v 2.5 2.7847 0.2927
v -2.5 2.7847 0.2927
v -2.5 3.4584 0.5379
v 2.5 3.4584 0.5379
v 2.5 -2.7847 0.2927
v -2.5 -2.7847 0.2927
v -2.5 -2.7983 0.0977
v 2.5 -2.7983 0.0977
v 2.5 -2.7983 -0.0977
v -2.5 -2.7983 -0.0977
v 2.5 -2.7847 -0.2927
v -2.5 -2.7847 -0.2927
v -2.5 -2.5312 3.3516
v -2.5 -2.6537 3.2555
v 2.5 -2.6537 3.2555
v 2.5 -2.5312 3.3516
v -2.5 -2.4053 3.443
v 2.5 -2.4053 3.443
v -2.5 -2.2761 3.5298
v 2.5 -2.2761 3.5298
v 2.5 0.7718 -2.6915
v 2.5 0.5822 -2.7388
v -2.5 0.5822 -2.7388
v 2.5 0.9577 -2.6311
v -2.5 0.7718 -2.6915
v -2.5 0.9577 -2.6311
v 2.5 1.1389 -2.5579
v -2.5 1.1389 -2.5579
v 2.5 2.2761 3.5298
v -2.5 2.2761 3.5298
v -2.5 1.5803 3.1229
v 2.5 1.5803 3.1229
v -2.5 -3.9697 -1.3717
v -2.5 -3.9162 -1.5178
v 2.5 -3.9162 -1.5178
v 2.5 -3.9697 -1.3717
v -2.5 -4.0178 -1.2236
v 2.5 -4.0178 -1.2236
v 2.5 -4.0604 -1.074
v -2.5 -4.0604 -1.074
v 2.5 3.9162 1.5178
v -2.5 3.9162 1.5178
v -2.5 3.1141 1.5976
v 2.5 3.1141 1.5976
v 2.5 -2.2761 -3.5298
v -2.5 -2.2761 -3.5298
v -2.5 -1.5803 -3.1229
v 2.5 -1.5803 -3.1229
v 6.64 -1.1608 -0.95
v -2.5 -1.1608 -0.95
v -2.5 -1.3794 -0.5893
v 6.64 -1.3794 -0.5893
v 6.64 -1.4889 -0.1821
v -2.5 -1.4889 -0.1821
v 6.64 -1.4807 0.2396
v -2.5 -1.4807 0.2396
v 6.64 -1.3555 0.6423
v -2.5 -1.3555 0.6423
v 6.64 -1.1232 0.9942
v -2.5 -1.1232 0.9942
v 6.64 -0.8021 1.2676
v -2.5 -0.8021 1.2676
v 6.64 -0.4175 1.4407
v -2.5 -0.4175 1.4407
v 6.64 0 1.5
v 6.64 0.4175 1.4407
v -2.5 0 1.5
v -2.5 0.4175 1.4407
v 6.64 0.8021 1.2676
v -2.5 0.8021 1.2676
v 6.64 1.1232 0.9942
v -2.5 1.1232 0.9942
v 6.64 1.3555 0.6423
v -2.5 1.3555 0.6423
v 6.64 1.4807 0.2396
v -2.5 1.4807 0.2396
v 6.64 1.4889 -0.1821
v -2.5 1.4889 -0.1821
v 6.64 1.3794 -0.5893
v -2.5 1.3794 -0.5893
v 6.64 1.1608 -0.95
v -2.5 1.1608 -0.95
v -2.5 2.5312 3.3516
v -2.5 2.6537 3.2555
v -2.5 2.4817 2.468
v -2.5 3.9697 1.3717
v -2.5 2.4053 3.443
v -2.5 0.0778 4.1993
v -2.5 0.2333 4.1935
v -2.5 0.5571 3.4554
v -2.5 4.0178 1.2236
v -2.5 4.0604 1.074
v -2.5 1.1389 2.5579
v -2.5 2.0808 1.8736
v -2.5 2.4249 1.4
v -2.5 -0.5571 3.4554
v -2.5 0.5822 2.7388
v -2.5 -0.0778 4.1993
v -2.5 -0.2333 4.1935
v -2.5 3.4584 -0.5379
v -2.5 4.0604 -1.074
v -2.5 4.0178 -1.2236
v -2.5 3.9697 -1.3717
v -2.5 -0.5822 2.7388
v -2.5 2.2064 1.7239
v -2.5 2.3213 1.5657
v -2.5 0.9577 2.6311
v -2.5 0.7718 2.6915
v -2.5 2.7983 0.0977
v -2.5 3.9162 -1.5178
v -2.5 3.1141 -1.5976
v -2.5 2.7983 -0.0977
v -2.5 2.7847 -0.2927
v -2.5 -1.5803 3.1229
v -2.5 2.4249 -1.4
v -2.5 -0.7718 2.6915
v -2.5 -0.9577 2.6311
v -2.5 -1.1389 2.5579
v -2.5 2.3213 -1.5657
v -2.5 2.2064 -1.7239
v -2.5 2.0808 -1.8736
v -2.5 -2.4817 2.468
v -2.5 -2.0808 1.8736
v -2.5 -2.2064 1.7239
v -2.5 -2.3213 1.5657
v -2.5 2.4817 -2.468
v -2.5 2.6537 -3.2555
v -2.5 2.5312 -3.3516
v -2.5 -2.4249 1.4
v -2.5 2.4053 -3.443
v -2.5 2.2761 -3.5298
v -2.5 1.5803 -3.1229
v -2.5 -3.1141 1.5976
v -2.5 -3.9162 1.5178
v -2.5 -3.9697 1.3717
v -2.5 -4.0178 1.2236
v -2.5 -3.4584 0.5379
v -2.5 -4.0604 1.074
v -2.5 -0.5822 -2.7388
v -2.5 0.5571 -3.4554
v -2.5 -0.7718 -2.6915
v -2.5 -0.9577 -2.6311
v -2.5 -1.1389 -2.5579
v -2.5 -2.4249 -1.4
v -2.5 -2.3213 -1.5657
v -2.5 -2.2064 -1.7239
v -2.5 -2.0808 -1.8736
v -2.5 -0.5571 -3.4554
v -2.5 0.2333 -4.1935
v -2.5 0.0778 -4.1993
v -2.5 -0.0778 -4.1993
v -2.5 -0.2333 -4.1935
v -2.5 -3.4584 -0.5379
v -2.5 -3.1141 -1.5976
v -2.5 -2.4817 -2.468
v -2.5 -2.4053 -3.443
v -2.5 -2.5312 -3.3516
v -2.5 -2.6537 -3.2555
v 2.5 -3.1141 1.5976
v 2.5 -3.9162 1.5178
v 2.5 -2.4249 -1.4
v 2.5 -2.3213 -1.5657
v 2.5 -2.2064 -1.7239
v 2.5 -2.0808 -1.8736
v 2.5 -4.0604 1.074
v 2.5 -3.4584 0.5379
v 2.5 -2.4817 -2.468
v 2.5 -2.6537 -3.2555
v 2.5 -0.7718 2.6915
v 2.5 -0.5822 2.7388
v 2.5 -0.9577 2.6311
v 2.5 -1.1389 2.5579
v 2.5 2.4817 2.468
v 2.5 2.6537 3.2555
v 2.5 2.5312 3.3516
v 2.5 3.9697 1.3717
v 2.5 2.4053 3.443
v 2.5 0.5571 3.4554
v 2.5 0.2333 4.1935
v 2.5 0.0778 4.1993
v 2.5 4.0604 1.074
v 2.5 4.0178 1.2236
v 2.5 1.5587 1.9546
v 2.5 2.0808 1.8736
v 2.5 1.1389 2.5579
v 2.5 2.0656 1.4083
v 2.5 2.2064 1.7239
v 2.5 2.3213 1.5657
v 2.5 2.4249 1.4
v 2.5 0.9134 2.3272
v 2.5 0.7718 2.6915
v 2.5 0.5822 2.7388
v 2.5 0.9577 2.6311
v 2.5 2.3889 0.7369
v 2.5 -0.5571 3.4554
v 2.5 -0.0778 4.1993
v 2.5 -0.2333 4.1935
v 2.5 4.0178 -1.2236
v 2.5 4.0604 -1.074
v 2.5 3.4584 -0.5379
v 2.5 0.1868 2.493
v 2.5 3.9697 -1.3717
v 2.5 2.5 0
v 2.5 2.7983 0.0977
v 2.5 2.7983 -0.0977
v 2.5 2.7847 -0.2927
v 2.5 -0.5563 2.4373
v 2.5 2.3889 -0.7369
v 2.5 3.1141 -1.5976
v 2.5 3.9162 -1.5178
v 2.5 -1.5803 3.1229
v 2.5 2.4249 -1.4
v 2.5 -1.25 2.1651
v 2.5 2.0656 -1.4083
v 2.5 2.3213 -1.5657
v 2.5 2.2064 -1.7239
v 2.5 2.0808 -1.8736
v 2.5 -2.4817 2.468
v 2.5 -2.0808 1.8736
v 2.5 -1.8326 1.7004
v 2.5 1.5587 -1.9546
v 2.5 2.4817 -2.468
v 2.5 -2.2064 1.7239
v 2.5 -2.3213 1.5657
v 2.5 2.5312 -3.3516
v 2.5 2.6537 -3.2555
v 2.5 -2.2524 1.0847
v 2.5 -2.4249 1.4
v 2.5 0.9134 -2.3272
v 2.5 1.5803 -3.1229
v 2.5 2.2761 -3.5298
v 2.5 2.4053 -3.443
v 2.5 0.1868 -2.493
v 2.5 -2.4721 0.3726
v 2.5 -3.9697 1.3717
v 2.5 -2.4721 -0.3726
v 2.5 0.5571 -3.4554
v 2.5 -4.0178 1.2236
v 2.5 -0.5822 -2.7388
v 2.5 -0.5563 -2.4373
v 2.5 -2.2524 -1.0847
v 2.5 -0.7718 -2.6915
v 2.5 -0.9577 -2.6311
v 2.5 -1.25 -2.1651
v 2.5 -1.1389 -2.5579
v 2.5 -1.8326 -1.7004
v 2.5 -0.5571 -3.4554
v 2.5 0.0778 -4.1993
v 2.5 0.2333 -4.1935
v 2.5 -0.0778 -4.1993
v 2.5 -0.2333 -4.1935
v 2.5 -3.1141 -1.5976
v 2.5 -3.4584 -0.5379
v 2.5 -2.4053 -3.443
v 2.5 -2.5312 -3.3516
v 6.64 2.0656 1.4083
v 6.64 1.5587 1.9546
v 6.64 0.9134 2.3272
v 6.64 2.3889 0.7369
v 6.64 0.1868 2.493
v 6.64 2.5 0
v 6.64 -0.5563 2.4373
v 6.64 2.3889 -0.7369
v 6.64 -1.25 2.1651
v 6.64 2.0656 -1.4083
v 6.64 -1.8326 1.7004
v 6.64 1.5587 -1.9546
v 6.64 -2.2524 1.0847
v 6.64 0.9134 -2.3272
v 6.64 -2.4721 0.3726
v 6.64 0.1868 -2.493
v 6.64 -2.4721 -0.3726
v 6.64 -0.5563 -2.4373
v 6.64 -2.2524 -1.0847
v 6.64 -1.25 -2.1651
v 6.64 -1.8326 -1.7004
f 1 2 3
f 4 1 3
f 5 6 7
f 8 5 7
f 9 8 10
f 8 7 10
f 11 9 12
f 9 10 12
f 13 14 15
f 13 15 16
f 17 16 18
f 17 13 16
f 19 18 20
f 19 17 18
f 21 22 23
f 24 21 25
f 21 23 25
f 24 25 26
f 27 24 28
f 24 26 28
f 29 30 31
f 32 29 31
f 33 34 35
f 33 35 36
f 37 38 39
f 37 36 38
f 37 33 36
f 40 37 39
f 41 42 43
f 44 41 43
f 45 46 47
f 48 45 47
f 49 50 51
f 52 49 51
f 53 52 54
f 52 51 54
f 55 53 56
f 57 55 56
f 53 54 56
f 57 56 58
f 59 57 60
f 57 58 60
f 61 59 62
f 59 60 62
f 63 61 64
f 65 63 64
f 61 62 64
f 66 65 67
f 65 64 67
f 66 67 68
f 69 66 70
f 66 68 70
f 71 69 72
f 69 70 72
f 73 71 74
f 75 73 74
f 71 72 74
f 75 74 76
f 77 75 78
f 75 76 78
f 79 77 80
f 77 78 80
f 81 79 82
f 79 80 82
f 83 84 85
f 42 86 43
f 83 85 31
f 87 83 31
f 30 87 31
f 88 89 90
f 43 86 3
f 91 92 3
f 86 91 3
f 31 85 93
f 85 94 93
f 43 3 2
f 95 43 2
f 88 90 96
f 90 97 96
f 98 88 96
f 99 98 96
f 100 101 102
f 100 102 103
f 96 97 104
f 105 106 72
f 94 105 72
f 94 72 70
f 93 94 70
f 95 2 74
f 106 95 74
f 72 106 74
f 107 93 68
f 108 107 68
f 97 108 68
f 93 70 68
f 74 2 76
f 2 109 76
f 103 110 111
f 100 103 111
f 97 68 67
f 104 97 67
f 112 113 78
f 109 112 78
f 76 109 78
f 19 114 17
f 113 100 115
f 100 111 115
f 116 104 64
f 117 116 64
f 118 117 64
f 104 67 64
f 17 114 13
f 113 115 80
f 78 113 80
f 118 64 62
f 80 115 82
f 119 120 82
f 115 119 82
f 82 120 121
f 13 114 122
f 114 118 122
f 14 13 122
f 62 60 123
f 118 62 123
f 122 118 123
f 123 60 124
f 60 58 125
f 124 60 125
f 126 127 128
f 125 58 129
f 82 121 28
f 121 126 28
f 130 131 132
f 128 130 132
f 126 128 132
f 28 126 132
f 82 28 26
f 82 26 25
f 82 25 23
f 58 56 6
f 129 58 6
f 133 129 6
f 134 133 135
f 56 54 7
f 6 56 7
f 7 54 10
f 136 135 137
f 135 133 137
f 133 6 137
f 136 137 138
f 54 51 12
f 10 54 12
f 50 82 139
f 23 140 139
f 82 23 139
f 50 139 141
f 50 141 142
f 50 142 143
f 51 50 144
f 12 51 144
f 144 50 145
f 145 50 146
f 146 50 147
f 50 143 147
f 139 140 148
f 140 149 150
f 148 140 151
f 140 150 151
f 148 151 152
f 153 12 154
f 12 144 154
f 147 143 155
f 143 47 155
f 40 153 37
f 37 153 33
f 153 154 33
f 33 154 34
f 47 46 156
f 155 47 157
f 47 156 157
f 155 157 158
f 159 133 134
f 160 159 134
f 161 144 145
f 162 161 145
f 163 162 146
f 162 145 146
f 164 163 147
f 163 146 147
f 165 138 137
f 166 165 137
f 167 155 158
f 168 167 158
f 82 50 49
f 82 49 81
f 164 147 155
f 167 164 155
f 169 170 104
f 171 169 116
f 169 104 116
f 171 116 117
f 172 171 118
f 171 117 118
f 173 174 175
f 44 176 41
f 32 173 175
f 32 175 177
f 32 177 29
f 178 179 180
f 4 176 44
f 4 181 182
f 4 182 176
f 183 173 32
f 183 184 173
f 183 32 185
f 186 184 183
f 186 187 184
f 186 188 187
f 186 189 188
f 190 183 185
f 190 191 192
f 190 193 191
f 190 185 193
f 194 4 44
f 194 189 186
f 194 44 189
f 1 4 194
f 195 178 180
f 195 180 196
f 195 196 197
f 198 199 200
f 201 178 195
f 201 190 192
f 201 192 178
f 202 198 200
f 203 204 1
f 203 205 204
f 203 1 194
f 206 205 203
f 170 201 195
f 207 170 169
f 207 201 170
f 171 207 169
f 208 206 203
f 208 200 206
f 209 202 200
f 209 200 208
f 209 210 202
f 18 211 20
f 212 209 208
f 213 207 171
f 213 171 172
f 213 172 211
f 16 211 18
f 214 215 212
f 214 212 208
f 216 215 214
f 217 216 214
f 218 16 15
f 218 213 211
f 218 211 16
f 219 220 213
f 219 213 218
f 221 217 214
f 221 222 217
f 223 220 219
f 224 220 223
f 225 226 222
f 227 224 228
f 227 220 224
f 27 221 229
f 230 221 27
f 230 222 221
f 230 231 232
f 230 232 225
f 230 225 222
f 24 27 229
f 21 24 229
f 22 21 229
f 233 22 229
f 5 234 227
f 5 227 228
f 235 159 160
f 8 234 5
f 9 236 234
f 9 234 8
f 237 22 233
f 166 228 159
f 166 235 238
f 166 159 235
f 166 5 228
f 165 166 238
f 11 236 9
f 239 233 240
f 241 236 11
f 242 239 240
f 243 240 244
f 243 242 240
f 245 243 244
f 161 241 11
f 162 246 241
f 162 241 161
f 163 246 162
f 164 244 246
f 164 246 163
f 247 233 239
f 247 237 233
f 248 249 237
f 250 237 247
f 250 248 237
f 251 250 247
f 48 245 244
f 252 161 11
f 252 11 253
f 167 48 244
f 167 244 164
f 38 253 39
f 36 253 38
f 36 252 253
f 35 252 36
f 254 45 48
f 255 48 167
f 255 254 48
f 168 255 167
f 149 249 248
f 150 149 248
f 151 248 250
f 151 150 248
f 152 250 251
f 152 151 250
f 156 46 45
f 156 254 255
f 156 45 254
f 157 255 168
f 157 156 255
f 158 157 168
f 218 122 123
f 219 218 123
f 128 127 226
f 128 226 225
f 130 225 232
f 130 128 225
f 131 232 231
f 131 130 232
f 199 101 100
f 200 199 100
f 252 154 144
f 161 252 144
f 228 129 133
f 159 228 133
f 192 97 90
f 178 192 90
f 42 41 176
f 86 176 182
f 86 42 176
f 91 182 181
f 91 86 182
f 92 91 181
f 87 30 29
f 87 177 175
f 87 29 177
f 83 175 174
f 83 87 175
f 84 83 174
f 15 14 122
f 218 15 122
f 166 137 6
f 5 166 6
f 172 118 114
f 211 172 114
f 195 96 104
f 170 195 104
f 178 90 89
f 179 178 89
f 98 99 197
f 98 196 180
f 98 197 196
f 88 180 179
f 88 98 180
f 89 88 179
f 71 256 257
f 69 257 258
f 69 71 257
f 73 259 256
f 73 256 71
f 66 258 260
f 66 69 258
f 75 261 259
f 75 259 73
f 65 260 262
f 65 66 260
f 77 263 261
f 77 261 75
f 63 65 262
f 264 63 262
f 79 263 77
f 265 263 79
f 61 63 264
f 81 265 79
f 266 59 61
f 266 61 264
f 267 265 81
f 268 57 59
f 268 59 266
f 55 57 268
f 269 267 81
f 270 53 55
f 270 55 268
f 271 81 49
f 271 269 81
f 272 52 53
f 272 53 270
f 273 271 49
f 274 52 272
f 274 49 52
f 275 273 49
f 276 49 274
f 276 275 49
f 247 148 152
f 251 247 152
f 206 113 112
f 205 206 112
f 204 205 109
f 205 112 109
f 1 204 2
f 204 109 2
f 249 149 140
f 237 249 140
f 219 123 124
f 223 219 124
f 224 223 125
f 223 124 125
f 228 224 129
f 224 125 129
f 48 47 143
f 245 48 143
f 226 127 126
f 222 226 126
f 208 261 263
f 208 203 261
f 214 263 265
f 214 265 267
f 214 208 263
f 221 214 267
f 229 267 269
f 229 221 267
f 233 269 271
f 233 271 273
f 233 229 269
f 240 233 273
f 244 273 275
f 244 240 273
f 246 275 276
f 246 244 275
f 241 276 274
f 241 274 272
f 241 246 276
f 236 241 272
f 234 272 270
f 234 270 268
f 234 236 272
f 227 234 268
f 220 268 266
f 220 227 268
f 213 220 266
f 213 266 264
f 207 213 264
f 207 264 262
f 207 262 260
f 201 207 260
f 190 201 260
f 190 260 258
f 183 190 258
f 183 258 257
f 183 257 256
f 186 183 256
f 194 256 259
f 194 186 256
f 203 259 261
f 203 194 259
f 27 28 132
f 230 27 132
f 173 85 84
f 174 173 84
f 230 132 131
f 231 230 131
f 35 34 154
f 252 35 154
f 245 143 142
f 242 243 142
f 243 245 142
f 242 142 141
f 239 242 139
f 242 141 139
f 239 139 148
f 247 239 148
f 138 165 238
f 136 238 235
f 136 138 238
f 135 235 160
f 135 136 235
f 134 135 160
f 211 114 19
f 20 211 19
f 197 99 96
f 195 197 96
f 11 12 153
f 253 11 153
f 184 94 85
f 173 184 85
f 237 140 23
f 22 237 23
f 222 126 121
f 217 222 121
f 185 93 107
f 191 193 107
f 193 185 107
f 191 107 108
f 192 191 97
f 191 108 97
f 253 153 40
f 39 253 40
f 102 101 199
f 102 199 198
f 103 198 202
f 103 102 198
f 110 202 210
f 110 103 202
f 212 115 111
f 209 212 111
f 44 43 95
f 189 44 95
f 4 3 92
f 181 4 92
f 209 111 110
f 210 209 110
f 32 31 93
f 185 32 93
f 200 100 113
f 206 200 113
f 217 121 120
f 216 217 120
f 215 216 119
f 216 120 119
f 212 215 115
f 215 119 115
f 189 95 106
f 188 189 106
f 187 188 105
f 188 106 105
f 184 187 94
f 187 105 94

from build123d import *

# Parameters (mm, degrees)
ESQUISSE1_W              = 5
ESQUISSE1_H              = 4.2
ENL_V_MAT_EXTRU_1_DEPTH  = 6
ENL_V_MAT_EXTRU_2_DEPTH  = 6
ENL_V_MAT_EXTRU_3_DEPTH  = 6
ENL_V_MAT_EXTRU_4_DEPTH  = 6
ENL_V_MAT_EXTRU_5_DEPTH  = 6
ENL_V_MAT_EXTRU_6_DEPTH  = 6
ENL_V_MAT_EXTRU_7_DEPTH  = 6
ENL_V_MAT_EXTRU_8_DEPTH  = 6
ENL_V_MAT_EXTRU_9_DEPTH  = 6
ENL_V_MAT_EXTRU_10_DEPTH = 6
ENL_V_MAT_EXTRU_11_DEPTH = 6
ENL_V_MAT_EXTRU_12_DEPTH = 6
ENL_V_MAT_EXTRU_13_DEPTH = 6
ENL_V_MAT_EXTRU_14_DEPTH = 6
ENL_V_MAT_EXTRU_15_DEPTH = 6
ENL_V_MAT_EXTRU_16_DEPTH = 6
ENL_V_MAT_EXTRU_17_DEPTH = 6
ENL_V_MAT_EXTRU_18_DEPTH = 6
ENL_V_MAT_EXTRU_19_DEPTH = 6
ENL_V_MAT_EXTRU_20_DEPTH = 6
ESQUISSE22_W             = 4.14
ESQUISSE22_H             = 2.5
ESQUISSE29_R             = 1.5
ENL_V_MAT_EXTRU_21_DEPTH = 10
BOSS_EXTRU_1_DEPTH       = 9.14


with BuildPart() as part:
    # Esquisse1 → Révolution1 (revolve)
    with BuildSketch(Plane(origin=(0, 0, 0), x_dir=(-1, 0, 0), z_dir=(0, 0, -1))):
        with Locations((0, 2.1)):
            Rectangle(ESQUISSE1_W, ESQUISSE1_H)
    revolve(axis=Axis((2.5, 0, 0), (-1, 0, 0)))

    # Esquisse2 → Enlèv. mat.-Extru.1 (cut, through all)
    with BuildSketch(Plane.ZY.offset(2.5)):
        with BuildLine():
            Line((4.19351351, -0.233333333), (2.714671649, -0.882050288))
            Line((2.714671649, -0.882050288), (3.529773588, -2.276114764))
            ThreePointArc((3.529773588, -2.276114764), (3.994437368, -1.297871376), (4.19351351, -0.233333333))
        make_face()
    extrude(amount=-ENL_V_MAT_EXTRU_1_DEPTH, mode=Mode.SUBTRACT)

    # Esquisse3 → Enlèv. mat.-Extru.2 (cut, through all)
    with BuildSketch(Plane.ZY.offset(2.5)):
        with BuildLine():
            Line((2.557927281, -1.138862601), (3.122928651, -1.58029005))
            Line((3.122928651, -1.58029005), (2.714671649, -0.882050288))
            Line((2.714671649, -0.882050288), (3.455373536, -0.557129899))
            Line((3.455373536, -0.557129899), (2.738813282, -0.582152734))
            ThreePointArc((2.738813282, -0.582152734), (2.662958246, -0.865247584), (2.557927281, -1.138862601))
        make_face()
    extrude(amount=-ENL_V_MAT_EXTRU_2_DEPTH, mode=Mode.SUBTRACT)

    # Esquisse4 → Enlèv. mat.-Extru.3 (cut, through all)
    with BuildSketch(Plane.ZY.offset(2.5)):
        with BuildLine():
            Line((3.255473803, -2.653656028), (1.677759348, -2.309237633))
            Line((1.677759348, -2.309237633), (1.517780128, -3.916164384))
            ThreePointArc((1.517780128, -3.916164384), (2.46869806, -3.397871376), (3.255473803, -2.653656028))
        make_face()
    extrude(amount=-ENL_V_MAT_EXTRU_3_DEPTH, mode=Mode.SUBTRACT)

    # Esquisse5 → Enlèv. mat.-Extru.4 (cut, through all)
    with BuildSketch(Plane.ZY.offset(2.5)):
        with BuildLine():
            Line((1.4, -2.424871131), (1.597631165, -3.114092911))
            Line((1.597631165, -3.114092911), (1.677759348, -2.309237633))
            Line((1.677759348, -2.309237633), (2.467983175, -2.481745162))
            Line((2.467983175, -2.481745162), (1.873565698, -2.080805511))
            ThreePointArc((1.873565698, -2.080805511), (1.645798706, -2.265247584), (1.4, -2.424871131))
        make_face()
    extrude(amount=-ENL_V_MAT_EXTRU_4_DEPTH, mode=Mode.SUBTRACT)

    # Esquisse6 → Enlèv. mat.-Extru.5 (cut, through all)
    with BuildSketch(Plane.ZY.offset(2.5)):
        with BuildLine():
            Line((1.073953753, -4.060372315), (0, -2.85437469))
            Line((0, -2.85437469), (-1.073953753, -4.060372315))
            ThreePointArc((-1.073953753, -4.060372315), (0, -4.2), (1.073953753, -4.060372315))
        make_face()
    extrude(amount=-ENL_V_MAT_EXTRU_5_DEPTH, mode=Mode.SUBTRACT)

    # Esquisse7 → Enlèv. mat.-Extru.6 (cut, through all)
    with BuildSketch(Plane.ZY.offset(2.5)):
        with BuildLine():
            Line((-0.292679697, -2.784661307), (-0.537907124, -3.458418125))
            Line((-0.537907124, -3.458418125), (0, -2.85437469))
            Line((0, -2.85437469), (0.537907124, -3.458418125))
            Line((0.537907124, -3.458418125), (0.292679697, -2.784661307))
            ThreePointArc((0.292679697, -2.784661307), (0, -2.8), (-0.292679697, -2.784661307))
        make_face()
    extrude(amount=-ENL_V_MAT_EXTRU_6_DEPTH, mode=Mode.SUBTRACT)

    # Esquisse8 → Enlèv. mat.-Extru.7 (cut, through all)
    with BuildSketch(Plane.ZY.offset(2.5)):
        with BuildLine():
            Line((-1.517780128, -3.916164384), (-1.677759348, -2.309237633))
            Line((-1.677759348, -2.309237633), (-3.255473803, -2.653656028))
            ThreePointArc((-3.255473803, -2.653656028), (-2.46869806, -3.397871376), (-1.517780128, -3.916164384))
        make_face()
    extrude(amount=-ENL_V_MAT_EXTRU_7_DEPTH, mode=Mode.SUBTRACT)

    # Esquisse9 → Enlèv. mat.-Extru.8 (cut, through all)
    with BuildSketch(Plane.ZY.offset(2.5)):
        with BuildLine():
            Line((-1.873565698, -2.080805511), (-2.467983175, -2.481745162))
            Line((-2.467983175, -2.481745162), (-1.677759348, -2.309237633))
            Line((-1.677759348, -2.309237633), (-1.597631165, -3.114092911))
            Line((-1.597631165, -3.114092911), (-1.4, -2.424871131))
            ThreePointArc((-1.4, -2.424871131), (-1.645798706, -2.265247584), (-1.873565698, -2.080805511))
        make_face()
    extrude(amount=-ENL_V_MAT_EXTRU_8_DEPTH, mode=Mode.SUBTRACT)

    # Esquisse10 → Enlèv. mat.-Extru.9 (cut, through all)
    with BuildSketch(Plane.ZY.offset(2.5)):
        with BuildLine():
            Line((-3.529773588, -2.276114764), (-2.714671649, -0.882050288))
            Line((-2.714671649, -0.882050288), (-4.19351351, -0.233333333))
            ThreePointArc((-4.19351351, -0.233333333), (-3.994437368, -1.297871376), (-3.529773588, -2.276114764))
        make_face()
    extrude(amount=-ENL_V_MAT_EXTRU_9_DEPTH, mode=Mode.SUBTRACT)

    # Esquisse11 → Enlèv. mat.-Extru.10 (cut, through all)
    with BuildSketch(Plane.ZY.offset(2.5)):
        with BuildLine():
            Line((-2.738813282, -0.582152734), (-3.455373536, -0.557129899))
            Line((-3.455373536, -0.557129899), (-2.714671649, -0.882050288))
            Line((-2.714671649, -0.882050288), (-3.122928651, -1.58029005))
            Line((-3.122928651, -1.58029005), (-2.557927281, -1.138862601))
            ThreePointArc((-2.557927281, -1.138862601), (-2.662958246, -0.865247584), (-2.738813282, -0.582152734))
        make_face()
    extrude(amount=-ENL_V_MAT_EXTRU_10_DEPTH, mode=Mode.SUBTRACT)

    # Esquisse12 → Enlèv. mat.-Extru.11 (cut, through all)
    with BuildSketch(Plane.ZY.offset(2.5)):
        with BuildLine():
            Line((-4.19351351, 0.233333333), (-2.714671649, 0.882050288))
            Line((-2.714671649, 0.882050288), (-3.529773588, 2.276114764))
            ThreePointArc((-3.529773588, 2.276114764), (-3.994437368, 1.297871376), (-4.19351351, 0.233333333))
        make_face()
    extrude(amount=-ENL_V_MAT_EXTRU_11_DEPTH, mode=Mode.SUBTRACT)

    # Esquisse13 → Enlèv. mat.-Extru.12 (cut, through all)
    with BuildSketch(Plane.ZY.offset(2.5)):
        with BuildLine():
            Line((-2.714671649, 0.882050288), (-3.455373536, 0.557129899))
            Line((-3.455373536, 0.557129899), (-2.738813282, 0.582152734))
            ThreePointArc((-2.738813282, 0.582152734), (-2.662958246, 0.865247584), (-2.557927281, 1.138862601))
            Line((-2.557927281, 1.138862601), (-3.122928651, 1.58029005))
            Line((-3.122928651, 1.58029005), (-2.714671649, 0.882050288))
        make_face()
    extrude(amount=-ENL_V_MAT_EXTRU_12_DEPTH, mode=Mode.SUBTRACT)

    # Esquisse14 → Enlèv. mat.-Extru.13 (cut, through all)
    with BuildSketch(Plane.ZY.offset(2.5)):
        with BuildLine():
            Line((-3.255473803, 2.653656028), (-1.677759348, 2.309237633))
            Line((-1.677759348, 2.309237633), (-1.517780128, 3.916164384))
            ThreePointArc((-1.517780128, 3.916164384), (-2.46869806, 3.397871376), (-3.255473803, 2.653656028))
        make_face()
    extrude(amount=-ENL_V_MAT_EXTRU_13_DEPTH, mode=Mode.SUBTRACT)

    # Esquisse15 → Enlèv. mat.-Extru.14 (cut, through all)
    with BuildSketch(Plane.ZY.offset(2.5)):
        with BuildLine():
            Line((-1.677759348, 2.309237633), (-2.467983175, 2.481745162))
            Line((-2.467983175, 2.481745162), (-1.873565698, 2.080805511))
            ThreePointArc((-1.873565698, 2.080805511), (-1.645798706, 2.265247584), (-1.4, 2.424871131))
            Line((-1.4, 2.424871131), (-1.597631165, 3.114092911))
            Line((-1.597631165, 3.114092911), (-1.677759348, 2.309237633))
        make_face()
    extrude(amount=-ENL_V_MAT_EXTRU_14_DEPTH, mode=Mode.SUBTRACT)

    # Esquisse16 → Enlèv. mat.-Extru.15 (cut, through all)
    with BuildSketch(Plane.ZY.offset(2.5)):
        with BuildLine():
            Line((-1.073953753, 4.060372315), (0, 2.85437469))
            Line((0, 2.85437469), (1.073953753, 4.060372315))
            ThreePointArc((1.073953753, 4.060372315), (0, 4.2), (-1.073953753, 4.060372315))
        make_face()
    extrude(amount=-ENL_V_MAT_EXTRU_15_DEPTH, mode=Mode.SUBTRACT)

    # Esquisse17 → Enlèv. mat.-Extru.16 (cut, through all)
    with BuildSketch(Plane.ZY.offset(2.5)):
        with BuildLine():
            Line((0, 2.85437469), (-0.537907124, 3.458418125))
            Line((-0.537907124, 3.458418125), (-0.292679697, 2.784661307))
            ThreePointArc((-0.292679697, 2.784661307), (0, 2.8), (0.292679697, 2.784661307))
            Line((0.292679697, 2.784661307), (0.537907124, 3.458418125))
            Line((0.537907124, 3.458418125), (0, 2.85437469))
        make_face()
    extrude(amount=-ENL_V_MAT_EXTRU_16_DEPTH, mode=Mode.SUBTRACT)

    # Esquisse18 → Enlèv. mat.-Extru.17 (cut, through all)
    with BuildSketch(Plane.ZY.offset(2.5)):
        with BuildLine():
            Line((1.517780128, 3.916164384), (1.677759348, 2.309237633))
            Line((1.677759348, 2.309237633), (3.255473803, 2.653656028))
            ThreePointArc((3.255473803, 2.653656028), (2.46869806, 3.397871376), (1.517780128, 3.916164384))
        make_face()
    extrude(amount=-ENL_V_MAT_EXTRU_17_DEPTH, mode=Mode.SUBTRACT)

    # Esquisse19 → Enlèv. mat.-Extru.18 (cut, through all)
    with BuildSketch(Plane.ZY.offset(2.5)):
        with BuildLine():
            Line((1.677759348, 2.309237633), (1.597631165, 3.114092911))
            Line((1.597631165, 3.114092911), (1.4, 2.424871131))
            ThreePointArc((1.4, 2.424871131), (1.645798706, 2.265247584), (1.873565698, 2.080805511))
            Line((1.873565698, 2.080805511), (2.467983175, 2.481745162))
            Line((2.467983175, 2.481745162), (1.677759348, 2.309237633))
        make_face()
    extrude(amount=-ENL_V_MAT_EXTRU_18_DEPTH, mode=Mode.SUBTRACT)

    # Esquisse20 → Enlèv. mat.-Extru.19 (cut, through all)
    with BuildSketch(Plane.ZY.offset(2.5)):
        with BuildLine():
            Line((3.529773588, 2.276114764), (2.714671649, 0.882050288))
            Line((2.714671649, 0.882050288), (4.19351351, 0.233333333))
            ThreePointArc((4.19351351, 0.233333333), (3.994437368, 1.297871376), (3.529773588, 2.276114764))
        make_face()
    extrude(amount=-ENL_V_MAT_EXTRU_19_DEPTH, mode=Mode.SUBTRACT)

    # Esquisse21 → Enlèv. mat.-Extru.20 (cut, through all)
    with BuildSketch(Plane.ZY.offset(2.5)):
        with BuildLine():
            Line((2.714671649, 0.882050288), (3.122928651, 1.58029005))
            Line((3.122928651, 1.58029005), (2.557927281, 1.138862601))
            ThreePointArc((2.557927281, 1.138862601), (2.662958246, 0.865247584), (2.738813282, 0.582152734))
            Line((2.738813282, 0.582152734), (3.455373536, 0.557129899))
            Line((3.455373536, 0.557129899), (2.714671649, 0.882050288))
        make_face()
    extrude(amount=-ENL_V_MAT_EXTRU_20_DEPTH, mode=Mode.SUBTRACT)

    # Esquisse22 → Révolution2 (revolve)
    with BuildSketch(Plane(origin=(0, 0, 0), x_dir=(-1, 0, 0), z_dir=(0, 0, -1))):
        with Locations((-4.57, 1.25)):
            Rectangle(ESQUISSE22_W, ESQUISSE22_H)
    revolve(axis=Axis((6.64, 0, 0), (-1, 0, 0)))

    # Esquisse29 → Enlèv. mat.-Extru.21 (cut)
    with BuildSketch(Plane.ZY.offset(2.5)):
        Circle(ESQUISSE29_R)
    extrude(amount=-ENL_V_MAT_EXTRU_21_DEPTH, mode=Mode.SUBTRACT)

    # Esquisse31 → Boss.-Extru.1 (add)
    with BuildSketch(Plane.ZY.offset(2.5)):
        with BuildLine():
            Line((-0.95, 0), (-0.95, 1.160818677))
            ThreePointArc((-0.95, 1.160818677), (-1.5, 0), (-0.95, -1.160818677))
            Line((-0.95, -1.160818677), (-0.95, 0))
        make_face()
    extrude(amount=-BOSS_EXTRU_1_DEPTH)


solid = part.part
